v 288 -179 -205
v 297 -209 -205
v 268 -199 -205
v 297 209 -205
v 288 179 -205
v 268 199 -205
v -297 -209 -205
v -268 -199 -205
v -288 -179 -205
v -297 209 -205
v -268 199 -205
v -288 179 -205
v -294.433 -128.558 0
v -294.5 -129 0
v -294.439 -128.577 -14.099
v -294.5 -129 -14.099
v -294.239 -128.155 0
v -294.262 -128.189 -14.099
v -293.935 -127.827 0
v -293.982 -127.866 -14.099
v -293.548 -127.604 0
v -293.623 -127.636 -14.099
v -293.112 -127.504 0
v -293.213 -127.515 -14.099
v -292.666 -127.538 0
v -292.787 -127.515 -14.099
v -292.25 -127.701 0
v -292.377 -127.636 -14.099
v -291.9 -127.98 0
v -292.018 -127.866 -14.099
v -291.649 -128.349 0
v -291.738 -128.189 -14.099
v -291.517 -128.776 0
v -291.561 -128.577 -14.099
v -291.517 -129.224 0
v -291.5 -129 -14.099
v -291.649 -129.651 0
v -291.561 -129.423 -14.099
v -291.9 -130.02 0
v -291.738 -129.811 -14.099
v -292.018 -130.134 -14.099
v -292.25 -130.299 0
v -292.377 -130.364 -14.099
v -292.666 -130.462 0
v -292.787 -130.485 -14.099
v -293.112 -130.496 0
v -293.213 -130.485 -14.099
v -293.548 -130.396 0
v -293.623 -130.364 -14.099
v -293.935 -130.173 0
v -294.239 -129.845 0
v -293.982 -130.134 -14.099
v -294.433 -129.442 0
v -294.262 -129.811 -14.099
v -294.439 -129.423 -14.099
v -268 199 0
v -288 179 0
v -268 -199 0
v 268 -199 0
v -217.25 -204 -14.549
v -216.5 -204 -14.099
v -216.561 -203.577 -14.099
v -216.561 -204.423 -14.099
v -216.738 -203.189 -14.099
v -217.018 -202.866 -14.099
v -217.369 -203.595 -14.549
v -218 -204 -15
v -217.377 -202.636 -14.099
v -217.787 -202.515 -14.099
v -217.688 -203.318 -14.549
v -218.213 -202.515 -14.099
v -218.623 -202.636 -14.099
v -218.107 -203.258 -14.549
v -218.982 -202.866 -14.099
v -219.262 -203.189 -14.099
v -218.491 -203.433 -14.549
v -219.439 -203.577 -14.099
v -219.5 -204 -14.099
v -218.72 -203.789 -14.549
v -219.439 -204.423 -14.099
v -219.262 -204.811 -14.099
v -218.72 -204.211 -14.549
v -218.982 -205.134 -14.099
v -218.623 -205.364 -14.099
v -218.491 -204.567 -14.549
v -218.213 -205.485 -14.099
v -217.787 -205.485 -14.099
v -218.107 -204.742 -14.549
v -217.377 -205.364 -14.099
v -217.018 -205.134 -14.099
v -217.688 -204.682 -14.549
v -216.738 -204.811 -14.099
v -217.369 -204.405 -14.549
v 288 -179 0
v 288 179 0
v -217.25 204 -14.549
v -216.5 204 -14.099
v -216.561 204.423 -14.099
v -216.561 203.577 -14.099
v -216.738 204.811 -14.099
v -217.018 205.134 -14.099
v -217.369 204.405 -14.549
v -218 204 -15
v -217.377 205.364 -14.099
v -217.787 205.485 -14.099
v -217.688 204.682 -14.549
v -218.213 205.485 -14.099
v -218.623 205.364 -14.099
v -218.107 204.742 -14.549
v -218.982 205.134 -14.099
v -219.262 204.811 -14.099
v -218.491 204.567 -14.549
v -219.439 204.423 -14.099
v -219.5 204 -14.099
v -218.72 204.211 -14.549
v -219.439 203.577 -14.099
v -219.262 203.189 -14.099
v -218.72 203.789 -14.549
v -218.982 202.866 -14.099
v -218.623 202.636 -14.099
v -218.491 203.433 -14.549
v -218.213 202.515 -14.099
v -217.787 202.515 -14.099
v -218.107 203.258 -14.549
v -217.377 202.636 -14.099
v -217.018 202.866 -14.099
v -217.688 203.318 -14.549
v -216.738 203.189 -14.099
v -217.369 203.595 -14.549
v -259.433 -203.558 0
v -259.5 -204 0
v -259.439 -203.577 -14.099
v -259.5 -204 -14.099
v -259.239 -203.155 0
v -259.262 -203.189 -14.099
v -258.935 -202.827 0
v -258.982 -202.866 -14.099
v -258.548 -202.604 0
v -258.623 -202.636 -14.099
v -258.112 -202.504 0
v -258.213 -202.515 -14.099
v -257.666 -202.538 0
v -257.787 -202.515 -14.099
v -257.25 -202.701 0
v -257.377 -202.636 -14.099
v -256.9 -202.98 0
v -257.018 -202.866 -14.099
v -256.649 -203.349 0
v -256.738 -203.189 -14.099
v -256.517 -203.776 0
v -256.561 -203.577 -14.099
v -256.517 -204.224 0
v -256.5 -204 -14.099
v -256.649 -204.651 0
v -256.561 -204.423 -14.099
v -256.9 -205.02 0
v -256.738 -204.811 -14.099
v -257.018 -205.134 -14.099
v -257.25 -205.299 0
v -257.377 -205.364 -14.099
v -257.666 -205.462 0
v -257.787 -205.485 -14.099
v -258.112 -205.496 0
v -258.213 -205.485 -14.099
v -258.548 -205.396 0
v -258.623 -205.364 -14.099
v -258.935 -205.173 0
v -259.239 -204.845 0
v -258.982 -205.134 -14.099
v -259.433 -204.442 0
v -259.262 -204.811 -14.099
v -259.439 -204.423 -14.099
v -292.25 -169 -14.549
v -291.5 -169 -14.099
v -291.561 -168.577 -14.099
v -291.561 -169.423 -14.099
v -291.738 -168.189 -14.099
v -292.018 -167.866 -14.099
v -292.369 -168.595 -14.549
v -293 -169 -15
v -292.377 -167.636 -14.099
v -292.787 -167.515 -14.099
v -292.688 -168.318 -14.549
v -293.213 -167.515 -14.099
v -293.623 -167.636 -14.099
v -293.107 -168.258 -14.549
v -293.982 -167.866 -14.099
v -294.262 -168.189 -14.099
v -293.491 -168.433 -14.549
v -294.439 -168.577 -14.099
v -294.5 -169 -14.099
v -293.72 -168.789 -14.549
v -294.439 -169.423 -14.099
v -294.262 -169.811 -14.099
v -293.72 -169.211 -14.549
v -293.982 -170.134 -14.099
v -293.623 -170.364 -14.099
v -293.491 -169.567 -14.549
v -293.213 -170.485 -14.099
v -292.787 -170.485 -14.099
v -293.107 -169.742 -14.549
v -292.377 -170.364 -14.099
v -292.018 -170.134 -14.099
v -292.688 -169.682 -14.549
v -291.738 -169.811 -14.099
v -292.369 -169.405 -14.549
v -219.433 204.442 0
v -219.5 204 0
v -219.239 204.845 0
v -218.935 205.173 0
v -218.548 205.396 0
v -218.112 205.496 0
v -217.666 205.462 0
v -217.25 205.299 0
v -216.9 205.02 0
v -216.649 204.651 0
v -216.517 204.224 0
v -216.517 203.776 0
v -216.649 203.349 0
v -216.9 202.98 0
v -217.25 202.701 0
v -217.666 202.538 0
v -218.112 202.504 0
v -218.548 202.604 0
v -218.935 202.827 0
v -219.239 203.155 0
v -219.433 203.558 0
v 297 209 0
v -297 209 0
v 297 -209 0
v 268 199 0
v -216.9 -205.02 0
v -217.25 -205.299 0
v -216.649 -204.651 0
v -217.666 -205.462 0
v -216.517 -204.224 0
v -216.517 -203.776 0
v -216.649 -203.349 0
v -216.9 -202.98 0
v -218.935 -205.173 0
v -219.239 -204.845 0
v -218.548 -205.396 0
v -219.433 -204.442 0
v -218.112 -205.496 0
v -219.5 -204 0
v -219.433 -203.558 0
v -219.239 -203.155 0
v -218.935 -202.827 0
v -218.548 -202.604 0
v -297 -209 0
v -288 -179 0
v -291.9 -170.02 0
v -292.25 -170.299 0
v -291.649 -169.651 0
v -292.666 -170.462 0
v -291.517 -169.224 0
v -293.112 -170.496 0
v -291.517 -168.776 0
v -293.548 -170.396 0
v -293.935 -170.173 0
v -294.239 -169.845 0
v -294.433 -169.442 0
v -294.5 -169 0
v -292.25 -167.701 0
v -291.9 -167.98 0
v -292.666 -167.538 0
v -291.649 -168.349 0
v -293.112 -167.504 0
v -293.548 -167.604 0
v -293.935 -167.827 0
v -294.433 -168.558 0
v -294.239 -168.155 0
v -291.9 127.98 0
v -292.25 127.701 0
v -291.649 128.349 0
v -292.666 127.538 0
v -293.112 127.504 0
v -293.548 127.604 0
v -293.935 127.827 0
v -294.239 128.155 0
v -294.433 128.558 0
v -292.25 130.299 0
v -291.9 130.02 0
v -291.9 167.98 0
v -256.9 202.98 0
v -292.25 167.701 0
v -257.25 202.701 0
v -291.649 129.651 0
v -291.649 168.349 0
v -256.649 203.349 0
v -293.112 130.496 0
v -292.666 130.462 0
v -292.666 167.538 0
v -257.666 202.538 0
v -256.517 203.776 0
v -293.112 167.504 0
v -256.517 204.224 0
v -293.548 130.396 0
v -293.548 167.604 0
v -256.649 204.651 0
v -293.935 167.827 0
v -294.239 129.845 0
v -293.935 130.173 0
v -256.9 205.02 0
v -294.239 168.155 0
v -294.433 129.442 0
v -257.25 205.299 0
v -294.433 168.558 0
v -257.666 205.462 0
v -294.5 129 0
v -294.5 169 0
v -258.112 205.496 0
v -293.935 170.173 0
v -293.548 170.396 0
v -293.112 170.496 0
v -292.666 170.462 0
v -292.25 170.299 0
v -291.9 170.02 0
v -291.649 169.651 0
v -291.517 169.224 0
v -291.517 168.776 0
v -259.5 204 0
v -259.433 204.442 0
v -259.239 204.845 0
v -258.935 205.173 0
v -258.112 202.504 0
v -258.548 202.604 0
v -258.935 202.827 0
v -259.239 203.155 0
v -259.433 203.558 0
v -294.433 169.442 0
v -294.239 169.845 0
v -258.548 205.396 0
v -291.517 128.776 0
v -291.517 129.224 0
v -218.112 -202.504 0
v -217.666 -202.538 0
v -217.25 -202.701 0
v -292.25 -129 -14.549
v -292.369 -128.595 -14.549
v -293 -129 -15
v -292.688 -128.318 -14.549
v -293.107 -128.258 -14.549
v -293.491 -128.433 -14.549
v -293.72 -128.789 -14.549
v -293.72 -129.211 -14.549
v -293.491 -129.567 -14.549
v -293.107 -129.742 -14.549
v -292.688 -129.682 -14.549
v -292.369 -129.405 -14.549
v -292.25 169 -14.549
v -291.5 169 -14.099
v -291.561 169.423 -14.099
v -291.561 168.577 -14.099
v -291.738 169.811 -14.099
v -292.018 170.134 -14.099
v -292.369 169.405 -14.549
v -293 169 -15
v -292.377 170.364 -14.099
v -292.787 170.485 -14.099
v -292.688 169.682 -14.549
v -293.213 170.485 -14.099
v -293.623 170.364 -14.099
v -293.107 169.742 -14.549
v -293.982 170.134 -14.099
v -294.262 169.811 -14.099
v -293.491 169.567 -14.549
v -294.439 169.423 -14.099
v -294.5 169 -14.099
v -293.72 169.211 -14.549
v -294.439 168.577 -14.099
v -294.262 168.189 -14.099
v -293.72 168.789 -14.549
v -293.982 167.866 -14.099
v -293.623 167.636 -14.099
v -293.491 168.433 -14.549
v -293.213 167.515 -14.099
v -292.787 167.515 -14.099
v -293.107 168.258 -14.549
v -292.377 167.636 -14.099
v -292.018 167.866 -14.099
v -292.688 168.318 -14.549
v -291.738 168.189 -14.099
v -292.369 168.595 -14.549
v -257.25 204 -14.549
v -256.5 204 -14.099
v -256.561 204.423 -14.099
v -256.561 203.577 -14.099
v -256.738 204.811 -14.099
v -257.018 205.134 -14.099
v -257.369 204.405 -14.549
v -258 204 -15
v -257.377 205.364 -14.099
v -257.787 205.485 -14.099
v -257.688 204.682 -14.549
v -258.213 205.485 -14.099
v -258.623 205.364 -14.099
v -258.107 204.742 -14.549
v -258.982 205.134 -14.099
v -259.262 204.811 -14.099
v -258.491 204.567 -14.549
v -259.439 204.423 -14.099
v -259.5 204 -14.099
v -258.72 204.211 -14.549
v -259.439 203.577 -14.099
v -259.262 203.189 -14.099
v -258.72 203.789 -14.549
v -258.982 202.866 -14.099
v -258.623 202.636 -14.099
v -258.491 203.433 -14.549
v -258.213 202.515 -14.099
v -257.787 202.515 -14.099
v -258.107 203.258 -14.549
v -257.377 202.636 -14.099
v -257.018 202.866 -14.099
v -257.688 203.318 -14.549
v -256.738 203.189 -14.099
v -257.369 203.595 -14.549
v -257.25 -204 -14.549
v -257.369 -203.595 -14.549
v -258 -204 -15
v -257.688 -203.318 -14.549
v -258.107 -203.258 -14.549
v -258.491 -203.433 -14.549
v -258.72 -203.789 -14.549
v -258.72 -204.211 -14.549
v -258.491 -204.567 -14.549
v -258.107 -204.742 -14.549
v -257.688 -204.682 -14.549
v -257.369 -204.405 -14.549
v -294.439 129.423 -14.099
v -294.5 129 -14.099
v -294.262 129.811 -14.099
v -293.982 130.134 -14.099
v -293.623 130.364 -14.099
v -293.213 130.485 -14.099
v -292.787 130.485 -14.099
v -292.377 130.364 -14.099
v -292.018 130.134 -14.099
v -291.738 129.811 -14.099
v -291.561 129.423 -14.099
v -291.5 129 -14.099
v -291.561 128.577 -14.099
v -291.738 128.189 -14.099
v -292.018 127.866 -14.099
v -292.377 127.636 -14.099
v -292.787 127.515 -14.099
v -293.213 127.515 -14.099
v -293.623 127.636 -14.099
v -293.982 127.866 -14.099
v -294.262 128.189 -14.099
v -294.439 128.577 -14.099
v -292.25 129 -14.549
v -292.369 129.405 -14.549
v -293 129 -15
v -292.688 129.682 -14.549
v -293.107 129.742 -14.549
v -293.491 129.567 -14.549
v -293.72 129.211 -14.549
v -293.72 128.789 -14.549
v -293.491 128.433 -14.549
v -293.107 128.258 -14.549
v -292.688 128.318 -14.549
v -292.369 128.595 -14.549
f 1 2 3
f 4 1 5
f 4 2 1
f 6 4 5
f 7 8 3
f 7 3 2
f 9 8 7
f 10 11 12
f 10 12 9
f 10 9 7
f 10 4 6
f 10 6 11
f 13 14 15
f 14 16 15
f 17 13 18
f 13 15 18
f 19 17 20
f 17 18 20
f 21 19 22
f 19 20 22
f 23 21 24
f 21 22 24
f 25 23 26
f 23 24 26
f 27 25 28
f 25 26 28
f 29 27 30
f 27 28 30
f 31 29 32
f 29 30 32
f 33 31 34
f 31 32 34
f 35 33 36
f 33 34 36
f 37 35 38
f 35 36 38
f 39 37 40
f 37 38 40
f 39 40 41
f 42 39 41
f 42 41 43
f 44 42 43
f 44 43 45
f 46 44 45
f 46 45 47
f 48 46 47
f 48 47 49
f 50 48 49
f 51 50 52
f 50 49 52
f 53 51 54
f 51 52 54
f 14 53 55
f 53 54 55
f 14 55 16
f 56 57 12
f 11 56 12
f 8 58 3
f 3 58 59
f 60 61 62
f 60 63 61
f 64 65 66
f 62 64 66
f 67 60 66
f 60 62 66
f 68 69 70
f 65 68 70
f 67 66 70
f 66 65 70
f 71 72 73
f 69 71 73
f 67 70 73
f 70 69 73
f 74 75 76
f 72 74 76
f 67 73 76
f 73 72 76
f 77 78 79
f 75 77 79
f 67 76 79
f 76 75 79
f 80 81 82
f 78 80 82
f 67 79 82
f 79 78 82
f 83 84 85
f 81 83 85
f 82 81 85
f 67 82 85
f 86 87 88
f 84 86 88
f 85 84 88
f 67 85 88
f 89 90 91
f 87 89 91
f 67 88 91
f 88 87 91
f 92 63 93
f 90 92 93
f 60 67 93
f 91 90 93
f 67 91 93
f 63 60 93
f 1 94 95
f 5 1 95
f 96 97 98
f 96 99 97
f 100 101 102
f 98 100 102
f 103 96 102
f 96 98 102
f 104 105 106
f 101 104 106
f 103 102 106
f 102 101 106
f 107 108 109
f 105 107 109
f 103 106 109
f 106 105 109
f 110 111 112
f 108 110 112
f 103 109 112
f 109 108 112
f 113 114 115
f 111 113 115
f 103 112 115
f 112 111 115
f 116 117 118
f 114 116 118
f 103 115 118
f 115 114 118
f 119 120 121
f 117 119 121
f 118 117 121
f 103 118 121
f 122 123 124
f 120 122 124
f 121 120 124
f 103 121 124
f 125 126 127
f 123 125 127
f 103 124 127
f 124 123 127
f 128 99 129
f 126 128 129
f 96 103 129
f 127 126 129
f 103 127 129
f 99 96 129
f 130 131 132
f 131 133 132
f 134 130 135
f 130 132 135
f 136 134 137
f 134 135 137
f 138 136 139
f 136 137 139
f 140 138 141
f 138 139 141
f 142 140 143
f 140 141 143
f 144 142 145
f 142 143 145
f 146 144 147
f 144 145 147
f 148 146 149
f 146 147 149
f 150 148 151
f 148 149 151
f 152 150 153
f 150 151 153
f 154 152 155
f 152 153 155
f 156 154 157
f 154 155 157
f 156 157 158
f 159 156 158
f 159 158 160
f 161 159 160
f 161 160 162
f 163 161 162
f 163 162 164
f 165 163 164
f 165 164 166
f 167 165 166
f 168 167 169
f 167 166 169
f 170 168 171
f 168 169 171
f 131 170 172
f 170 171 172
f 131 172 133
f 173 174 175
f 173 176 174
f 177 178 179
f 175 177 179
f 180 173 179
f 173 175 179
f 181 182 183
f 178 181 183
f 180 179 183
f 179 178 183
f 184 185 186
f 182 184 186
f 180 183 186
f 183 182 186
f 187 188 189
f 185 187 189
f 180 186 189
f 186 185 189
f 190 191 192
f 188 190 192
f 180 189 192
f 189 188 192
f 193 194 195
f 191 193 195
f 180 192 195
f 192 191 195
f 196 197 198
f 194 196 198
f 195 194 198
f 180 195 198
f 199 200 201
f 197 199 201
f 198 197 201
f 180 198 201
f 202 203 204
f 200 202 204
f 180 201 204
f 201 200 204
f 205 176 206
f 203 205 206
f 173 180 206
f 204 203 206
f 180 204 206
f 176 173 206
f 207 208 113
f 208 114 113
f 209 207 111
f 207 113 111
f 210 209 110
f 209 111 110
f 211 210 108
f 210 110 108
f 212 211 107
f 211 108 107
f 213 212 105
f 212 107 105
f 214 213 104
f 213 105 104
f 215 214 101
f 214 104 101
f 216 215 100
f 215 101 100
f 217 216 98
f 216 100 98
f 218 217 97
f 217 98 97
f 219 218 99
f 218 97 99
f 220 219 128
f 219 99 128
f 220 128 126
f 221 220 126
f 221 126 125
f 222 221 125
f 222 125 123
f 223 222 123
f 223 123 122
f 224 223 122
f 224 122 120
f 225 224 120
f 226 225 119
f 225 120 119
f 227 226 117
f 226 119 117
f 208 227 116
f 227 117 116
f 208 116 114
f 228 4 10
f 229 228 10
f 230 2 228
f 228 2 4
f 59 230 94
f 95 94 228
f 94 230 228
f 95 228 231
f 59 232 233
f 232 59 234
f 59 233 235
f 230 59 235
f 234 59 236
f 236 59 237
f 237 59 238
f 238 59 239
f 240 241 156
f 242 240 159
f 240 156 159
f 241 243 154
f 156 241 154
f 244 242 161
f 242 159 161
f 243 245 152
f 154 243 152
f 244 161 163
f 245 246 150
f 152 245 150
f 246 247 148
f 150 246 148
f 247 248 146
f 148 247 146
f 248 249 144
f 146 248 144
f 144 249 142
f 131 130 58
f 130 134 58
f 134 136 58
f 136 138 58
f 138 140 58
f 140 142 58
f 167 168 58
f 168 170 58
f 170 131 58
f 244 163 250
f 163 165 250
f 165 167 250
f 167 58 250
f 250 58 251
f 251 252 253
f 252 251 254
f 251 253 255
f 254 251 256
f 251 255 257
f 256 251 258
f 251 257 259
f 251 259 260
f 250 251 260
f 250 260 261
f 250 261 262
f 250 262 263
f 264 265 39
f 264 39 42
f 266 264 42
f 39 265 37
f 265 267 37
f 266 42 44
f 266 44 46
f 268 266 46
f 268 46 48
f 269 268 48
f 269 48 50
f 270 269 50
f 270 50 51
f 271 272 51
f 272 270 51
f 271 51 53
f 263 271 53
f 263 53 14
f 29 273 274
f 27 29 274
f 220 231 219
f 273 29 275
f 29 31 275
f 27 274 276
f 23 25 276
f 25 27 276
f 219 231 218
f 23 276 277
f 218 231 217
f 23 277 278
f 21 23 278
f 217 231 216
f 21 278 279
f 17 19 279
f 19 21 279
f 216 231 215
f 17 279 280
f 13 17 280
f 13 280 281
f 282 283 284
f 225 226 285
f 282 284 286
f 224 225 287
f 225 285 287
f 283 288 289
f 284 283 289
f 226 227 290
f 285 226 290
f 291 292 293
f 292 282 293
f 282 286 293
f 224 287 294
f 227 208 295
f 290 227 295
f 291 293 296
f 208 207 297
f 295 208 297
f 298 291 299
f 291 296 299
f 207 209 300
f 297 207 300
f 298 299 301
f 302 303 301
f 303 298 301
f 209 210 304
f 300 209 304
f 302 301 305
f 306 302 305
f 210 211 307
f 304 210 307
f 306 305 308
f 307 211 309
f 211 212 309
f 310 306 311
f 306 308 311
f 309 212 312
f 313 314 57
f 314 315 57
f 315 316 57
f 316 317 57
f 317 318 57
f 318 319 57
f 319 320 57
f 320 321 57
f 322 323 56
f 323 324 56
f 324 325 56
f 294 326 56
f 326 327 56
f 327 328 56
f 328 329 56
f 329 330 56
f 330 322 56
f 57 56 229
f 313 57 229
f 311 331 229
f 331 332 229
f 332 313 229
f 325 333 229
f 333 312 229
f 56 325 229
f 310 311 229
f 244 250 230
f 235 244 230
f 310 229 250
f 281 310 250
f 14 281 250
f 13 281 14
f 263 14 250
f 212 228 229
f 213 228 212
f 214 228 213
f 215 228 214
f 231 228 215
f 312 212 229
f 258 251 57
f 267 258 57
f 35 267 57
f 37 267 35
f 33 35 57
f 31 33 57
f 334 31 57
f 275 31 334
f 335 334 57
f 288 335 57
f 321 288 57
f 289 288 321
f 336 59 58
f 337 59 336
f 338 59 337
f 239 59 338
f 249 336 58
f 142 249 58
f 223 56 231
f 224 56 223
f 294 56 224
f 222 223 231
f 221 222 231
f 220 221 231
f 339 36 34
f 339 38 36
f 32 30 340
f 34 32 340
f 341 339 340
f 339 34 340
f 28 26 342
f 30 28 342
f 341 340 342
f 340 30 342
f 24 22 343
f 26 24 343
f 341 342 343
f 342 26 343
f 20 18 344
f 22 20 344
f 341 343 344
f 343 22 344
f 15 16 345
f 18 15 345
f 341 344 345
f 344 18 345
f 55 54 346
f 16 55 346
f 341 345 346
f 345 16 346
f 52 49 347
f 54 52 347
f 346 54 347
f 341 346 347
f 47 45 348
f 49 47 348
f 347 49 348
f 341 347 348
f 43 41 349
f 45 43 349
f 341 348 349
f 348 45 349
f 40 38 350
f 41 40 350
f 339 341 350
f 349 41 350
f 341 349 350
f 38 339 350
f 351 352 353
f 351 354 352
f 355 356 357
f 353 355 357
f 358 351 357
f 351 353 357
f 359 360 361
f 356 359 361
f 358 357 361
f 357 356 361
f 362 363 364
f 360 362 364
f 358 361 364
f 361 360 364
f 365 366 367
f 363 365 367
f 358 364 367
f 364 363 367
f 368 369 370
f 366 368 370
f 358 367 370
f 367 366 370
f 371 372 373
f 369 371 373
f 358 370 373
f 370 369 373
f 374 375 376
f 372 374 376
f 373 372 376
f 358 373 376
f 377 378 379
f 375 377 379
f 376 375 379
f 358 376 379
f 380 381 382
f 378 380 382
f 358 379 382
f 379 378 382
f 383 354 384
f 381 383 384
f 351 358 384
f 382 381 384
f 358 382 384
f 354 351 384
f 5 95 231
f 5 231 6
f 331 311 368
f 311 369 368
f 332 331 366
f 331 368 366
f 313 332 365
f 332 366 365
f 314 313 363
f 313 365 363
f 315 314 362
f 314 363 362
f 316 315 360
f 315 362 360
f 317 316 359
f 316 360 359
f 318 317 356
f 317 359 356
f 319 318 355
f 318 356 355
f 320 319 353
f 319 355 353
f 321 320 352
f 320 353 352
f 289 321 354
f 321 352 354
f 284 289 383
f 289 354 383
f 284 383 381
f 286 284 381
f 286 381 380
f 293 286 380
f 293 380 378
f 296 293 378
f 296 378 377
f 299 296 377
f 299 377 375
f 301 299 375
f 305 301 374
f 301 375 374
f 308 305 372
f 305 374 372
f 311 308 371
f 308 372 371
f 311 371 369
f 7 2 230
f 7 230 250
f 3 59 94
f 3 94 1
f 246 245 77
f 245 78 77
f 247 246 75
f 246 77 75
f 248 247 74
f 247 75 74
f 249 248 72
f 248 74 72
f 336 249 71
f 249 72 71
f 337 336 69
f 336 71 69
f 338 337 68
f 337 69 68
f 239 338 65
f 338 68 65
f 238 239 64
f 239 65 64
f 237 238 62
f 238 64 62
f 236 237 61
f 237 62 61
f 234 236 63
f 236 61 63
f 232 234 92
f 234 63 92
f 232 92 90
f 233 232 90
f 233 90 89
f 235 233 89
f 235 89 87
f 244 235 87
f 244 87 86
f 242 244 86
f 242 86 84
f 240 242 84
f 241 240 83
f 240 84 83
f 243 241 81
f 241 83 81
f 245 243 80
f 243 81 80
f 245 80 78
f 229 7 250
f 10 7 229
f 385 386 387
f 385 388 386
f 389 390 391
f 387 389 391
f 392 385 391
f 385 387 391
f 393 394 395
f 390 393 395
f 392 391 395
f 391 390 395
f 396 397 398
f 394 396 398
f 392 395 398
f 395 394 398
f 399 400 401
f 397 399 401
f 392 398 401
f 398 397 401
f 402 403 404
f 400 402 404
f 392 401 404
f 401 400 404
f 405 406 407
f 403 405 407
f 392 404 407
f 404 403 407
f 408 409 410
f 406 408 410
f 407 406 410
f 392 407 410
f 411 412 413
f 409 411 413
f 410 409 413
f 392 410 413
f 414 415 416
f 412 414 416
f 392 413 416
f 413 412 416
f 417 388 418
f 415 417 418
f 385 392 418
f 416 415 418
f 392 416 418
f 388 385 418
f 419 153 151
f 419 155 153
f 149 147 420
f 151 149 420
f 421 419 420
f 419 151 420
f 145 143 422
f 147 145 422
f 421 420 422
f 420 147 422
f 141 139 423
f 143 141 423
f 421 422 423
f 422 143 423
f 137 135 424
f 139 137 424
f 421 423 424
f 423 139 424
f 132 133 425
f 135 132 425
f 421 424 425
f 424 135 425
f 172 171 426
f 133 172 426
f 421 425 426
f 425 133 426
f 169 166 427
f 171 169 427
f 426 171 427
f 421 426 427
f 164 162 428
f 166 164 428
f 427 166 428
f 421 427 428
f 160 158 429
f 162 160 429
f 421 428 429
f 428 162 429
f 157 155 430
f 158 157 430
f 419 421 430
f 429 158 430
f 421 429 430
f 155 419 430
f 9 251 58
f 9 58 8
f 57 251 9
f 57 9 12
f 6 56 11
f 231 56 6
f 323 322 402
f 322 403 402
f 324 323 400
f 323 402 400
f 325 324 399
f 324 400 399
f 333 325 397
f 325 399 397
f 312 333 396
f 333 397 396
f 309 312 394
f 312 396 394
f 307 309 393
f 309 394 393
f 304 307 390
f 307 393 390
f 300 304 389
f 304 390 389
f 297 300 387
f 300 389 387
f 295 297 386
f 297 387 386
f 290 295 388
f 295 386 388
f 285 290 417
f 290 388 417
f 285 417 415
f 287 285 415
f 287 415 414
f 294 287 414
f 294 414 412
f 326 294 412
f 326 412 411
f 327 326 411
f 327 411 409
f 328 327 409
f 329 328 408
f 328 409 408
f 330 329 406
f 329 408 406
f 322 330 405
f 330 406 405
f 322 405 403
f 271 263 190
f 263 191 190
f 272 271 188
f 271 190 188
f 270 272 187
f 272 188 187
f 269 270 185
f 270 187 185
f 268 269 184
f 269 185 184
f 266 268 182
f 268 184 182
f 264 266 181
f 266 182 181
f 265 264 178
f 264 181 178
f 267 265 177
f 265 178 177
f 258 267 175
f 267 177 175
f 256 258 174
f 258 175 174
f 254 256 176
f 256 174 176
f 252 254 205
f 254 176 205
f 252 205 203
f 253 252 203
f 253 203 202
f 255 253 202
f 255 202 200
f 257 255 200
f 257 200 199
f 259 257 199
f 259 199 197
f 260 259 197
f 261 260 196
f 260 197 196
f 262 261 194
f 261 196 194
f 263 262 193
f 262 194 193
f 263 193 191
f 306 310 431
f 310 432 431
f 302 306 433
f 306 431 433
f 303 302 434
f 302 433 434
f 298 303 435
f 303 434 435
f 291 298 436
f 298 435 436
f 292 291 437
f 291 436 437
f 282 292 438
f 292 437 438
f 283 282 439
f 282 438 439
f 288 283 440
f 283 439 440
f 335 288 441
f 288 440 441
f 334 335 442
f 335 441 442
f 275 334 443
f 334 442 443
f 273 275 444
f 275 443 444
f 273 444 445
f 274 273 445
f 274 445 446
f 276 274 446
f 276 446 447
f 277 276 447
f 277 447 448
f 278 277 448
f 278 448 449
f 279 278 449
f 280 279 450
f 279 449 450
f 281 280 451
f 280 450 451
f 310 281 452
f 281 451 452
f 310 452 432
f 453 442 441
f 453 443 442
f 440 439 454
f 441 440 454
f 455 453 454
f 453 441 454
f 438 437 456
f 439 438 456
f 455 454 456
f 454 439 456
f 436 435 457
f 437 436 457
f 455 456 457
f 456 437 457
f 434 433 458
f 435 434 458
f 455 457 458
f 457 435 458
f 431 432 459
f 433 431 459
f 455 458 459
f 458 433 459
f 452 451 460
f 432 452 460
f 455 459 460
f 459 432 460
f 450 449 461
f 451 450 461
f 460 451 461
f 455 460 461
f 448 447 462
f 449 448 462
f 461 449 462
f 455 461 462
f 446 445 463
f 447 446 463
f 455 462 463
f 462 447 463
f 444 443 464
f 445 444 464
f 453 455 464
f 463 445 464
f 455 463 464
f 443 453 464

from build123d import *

# Parameters (mm, degrees)
SKETCH_1_W                = 594
SKETCH_1_H                = 418
EXTRUDE_1_DEPTH           = 205
SKETCH_2_W                = 576
SKETCH_2_H                = 398
CUT_EXTRUDE_1_DEPTH       = 418.031173895
HOLE_WIZARD_3_0_3_1_D     = 3
HOLE_WIZARD_3_0_3_1_DEPTH = 14.098709071
HOLE_WIZARD_3_0_3_1_TIP   = 0.901290929
CHAMFER_1_SIZE            = 20


with BuildPart() as part:
    # Эскиз1 → Бобышка-Вытянуть1 (new body)
    with BuildSketch(Plane(origin=(0, 0, -205), x_dir=(-1, 0, 0), z_dir=(0, 0, -1))):
        Rectangle(SKETCH_1_W, SKETCH_1_H)
    extrude(amount=-EXTRUDE_1_DEPTH)

    # Эскиз2 → Вырез-Вытянуть1 (cut, through all)
    with BuildSketch(Plane.XY):
        Rectangle(SKETCH_2_W, SKETCH_2_H)
    extrude(amount=-CUT_EXTRUDE_1_DEPTH, mode=Mode.SUBTRACT)

    # Диаметр отверстия Ø3.0 (3)1
    with Locations(Plane.XY):
        with Locations((-293, -169), (-293, -129), (-258, 204), (-293, 169), (-293, 129), (-218, 204), (-258, -204), (-218, -204)):
            Hole(HOLE_WIZARD_3_0_3_1_D / 2, depth=HOLE_WIZARD_3_0_3_1_DEPTH)
            with Locations((0, 0, -(HOLE_WIZARD_3_0_3_1_DEPTH + HOLE_WIZARD_3_0_3_1_TIP / 2))):  # 118° drill point
                Cone(0, HOLE_WIZARD_3_0_3_1_D / 2, HOLE_WIZARD_3_0_3_1_TIP, mode=Mode.SUBTRACT)

    # Фаска1
    chamfer_1_edges = [part.edges().sort_by_distance(p)[0] for p in [
        (288, 199, -102.5),
        (288, -199, -102.5),
        (-288, -199, -102.5),
        (-288, 199, -102.5),
    ]]
    chamfer(chamfer_1_edges, length=CHAMFER_1_SIZE)


solid = part.part
